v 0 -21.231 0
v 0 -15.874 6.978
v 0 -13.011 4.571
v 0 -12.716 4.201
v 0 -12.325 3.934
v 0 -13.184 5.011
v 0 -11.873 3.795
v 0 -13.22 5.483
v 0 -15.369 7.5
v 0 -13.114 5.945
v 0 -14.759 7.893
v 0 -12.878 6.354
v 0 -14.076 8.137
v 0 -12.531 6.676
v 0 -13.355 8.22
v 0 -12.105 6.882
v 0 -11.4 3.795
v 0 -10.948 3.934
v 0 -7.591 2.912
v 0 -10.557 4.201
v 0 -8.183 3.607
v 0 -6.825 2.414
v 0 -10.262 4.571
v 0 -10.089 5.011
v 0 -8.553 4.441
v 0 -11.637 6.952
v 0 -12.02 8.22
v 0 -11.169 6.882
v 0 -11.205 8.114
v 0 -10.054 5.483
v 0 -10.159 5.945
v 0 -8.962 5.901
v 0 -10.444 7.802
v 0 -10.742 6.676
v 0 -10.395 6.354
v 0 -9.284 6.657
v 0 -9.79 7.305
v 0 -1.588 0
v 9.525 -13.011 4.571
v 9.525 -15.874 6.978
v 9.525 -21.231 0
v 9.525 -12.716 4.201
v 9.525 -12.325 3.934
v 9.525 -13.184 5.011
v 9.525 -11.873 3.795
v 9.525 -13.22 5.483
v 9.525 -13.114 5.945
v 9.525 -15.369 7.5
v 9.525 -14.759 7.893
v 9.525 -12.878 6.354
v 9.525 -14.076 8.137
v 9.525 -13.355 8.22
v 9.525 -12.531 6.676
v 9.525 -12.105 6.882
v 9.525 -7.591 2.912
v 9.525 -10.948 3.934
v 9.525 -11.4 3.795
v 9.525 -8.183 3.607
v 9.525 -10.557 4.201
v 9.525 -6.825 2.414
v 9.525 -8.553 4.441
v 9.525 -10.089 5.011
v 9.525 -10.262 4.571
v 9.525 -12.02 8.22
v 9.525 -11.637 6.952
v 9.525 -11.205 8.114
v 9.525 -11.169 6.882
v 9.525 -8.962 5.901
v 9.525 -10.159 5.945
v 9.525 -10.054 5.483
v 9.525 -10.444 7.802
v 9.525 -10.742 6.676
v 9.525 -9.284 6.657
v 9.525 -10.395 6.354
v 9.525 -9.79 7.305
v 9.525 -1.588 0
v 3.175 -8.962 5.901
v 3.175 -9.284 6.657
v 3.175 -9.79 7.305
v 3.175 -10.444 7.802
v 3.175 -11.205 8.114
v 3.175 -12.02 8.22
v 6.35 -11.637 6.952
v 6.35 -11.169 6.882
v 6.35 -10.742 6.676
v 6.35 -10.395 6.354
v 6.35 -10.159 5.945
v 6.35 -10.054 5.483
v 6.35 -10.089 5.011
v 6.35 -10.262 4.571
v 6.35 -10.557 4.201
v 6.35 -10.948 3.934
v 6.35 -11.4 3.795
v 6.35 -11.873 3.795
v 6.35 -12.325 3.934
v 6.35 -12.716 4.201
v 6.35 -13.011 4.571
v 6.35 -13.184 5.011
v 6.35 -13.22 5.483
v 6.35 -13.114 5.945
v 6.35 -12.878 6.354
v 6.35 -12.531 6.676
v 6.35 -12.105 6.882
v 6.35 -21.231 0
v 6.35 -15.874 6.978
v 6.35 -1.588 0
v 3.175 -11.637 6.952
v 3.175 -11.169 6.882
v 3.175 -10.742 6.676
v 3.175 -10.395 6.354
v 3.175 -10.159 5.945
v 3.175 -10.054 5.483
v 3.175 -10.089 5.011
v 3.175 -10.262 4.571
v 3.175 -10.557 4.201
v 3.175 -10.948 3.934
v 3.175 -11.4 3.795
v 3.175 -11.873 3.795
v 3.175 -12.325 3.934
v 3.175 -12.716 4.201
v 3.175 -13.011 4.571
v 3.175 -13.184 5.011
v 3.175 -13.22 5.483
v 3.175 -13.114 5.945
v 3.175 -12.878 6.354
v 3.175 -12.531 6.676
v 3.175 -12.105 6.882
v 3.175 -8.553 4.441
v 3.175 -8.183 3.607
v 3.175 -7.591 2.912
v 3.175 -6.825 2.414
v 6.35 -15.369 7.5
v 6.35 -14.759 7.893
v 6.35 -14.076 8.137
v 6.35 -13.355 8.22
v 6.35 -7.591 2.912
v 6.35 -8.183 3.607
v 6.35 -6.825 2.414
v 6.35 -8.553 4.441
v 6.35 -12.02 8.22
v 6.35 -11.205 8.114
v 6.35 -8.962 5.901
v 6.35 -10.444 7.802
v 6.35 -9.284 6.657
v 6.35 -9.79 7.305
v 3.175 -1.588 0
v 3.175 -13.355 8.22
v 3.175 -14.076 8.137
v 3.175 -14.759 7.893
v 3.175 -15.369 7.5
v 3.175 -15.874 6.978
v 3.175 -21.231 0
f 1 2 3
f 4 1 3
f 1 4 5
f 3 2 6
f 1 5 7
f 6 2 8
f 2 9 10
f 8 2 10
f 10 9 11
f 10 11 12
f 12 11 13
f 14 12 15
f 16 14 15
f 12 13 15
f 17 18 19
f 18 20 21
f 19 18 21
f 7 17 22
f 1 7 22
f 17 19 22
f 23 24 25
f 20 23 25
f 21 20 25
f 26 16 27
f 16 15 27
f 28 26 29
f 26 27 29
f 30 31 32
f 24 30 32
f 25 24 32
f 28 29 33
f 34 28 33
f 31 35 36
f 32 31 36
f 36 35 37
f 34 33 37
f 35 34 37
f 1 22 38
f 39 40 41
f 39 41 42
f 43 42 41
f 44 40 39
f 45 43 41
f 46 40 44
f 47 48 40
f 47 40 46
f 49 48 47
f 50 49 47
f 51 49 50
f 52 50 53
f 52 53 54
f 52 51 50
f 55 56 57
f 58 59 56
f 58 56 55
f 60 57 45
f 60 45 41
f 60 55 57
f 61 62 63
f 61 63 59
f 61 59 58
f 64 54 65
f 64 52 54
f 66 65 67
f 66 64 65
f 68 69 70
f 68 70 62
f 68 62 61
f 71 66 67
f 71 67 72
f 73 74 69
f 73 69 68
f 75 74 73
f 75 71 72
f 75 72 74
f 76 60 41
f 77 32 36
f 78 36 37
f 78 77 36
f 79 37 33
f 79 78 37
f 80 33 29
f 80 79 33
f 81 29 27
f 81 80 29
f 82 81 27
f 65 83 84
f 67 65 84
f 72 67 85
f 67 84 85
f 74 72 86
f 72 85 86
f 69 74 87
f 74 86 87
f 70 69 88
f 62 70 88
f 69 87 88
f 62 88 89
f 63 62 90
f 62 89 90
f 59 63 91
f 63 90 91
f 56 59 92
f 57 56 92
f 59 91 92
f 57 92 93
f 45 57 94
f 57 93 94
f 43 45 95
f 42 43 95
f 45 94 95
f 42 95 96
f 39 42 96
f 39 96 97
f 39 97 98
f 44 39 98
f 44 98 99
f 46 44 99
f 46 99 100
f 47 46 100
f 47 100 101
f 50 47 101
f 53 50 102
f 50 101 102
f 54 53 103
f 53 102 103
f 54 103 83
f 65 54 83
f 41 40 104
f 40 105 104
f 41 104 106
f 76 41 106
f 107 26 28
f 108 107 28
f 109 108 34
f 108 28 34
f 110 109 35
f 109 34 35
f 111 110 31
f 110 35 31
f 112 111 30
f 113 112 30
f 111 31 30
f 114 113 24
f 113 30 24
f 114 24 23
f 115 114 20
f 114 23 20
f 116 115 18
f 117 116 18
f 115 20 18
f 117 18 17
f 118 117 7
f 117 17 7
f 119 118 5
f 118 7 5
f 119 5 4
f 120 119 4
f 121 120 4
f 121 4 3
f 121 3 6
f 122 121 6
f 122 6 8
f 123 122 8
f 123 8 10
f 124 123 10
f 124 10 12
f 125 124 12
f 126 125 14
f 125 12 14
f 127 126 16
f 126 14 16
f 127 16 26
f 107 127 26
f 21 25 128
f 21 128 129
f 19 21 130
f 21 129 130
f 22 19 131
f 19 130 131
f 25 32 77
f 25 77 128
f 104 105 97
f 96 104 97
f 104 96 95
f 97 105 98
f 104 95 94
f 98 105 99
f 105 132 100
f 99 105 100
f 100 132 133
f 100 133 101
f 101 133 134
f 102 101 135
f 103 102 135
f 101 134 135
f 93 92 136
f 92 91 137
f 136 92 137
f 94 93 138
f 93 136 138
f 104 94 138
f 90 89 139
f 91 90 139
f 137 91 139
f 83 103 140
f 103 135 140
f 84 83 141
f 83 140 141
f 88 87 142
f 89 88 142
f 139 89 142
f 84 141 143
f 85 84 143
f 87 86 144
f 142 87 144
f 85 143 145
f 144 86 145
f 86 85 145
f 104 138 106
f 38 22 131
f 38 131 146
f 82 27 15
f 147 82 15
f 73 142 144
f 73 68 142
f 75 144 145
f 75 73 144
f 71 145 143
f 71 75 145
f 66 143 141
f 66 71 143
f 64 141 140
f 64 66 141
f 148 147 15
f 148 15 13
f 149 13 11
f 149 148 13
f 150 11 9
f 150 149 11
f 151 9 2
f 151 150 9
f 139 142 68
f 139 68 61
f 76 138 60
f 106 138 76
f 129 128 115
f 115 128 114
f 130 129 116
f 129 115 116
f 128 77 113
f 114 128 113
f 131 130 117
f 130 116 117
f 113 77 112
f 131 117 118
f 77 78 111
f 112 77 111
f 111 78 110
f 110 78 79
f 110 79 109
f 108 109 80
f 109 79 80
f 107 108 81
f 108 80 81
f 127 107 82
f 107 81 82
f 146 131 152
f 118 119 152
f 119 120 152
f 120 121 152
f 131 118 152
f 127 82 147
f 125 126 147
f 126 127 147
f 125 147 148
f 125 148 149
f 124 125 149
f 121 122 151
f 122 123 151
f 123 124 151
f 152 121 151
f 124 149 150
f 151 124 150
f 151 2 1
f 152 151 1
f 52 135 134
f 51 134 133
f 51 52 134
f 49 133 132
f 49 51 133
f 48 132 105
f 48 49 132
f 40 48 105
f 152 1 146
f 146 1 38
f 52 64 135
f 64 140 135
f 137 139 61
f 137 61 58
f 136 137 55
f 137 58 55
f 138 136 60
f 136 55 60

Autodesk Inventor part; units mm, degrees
ref_plane "YZ Plane" through (0, 0, 0) normal (1, 0, 0) x (0, 1, 0)
ref_plane "XZ Plane" through (0, 0, 0) normal (0, 1, 0) x (-1, 0, 0)
ref_plane "XY Plane" through (0, 0, 0) normal (0, 0, 1) x (1, 0, 0)
sketch "Sketch1" plane through (0, 0, 0) normal (1, 0, 0) x (0, 1, 0)
  line L0 (-9.6115, 8.22) -> (-14.9205, 8.22)
  line L1 (-14.9205, 8.22) -> (-21.231, 0)
  line L2 (-21.231, 0) -> (-1.5875, 0)
  line L3 (-9.6115, 8.22) -> (-8.1578, 3.0283)
  line L4 (-8.1578, 3.0283) -> (-1.5875, 0)
  point P0 (0, 0)
extrude "Extrusion1" add sketch "Sketch1" along normal blind 9.525
fillet "Fillet1" radius 3.175 2 edges at (4.7625, -9.6115, 8.22) (4.7625, -14.9205, 8.22)
sketch "Sketch3" plane through (0, -13.3553, 8.22) normal (0, 0, 1) x (1, 0, 0)
  line L0 (6.35, -11.8558) -> (6.35, 11.9002)
  line L1 (6.35, 11.9002) -> (3.175, 11.9002)
  line L2 (3.175, 11.9002) -> (3.175, -11.8558)
  line L3 (3.175, -11.8558) -> (6.35, -11.8558)
  line L4 (0, 0.0222) -> (9.525, 0.0222) projected
  line L5 (6.35, -11.8558) -> (3.175, 11.9002) construction
  line L6 (6.35, 11.9002) -> (3.175, -11.8558) construction
  point P0 (0, 13.3553)
  point P1 (4.7625, 0.0222)
extrude "Extrusion2" cut sketch "Sketch3" against normal blind 9.525
sketch "Sketch4" plane through (0, 0, 0) normal (-1, 0, 0) x (0, 0, 1)
  circle A0 centre (5.3647, -11.6366) radius 1.5875
  point P0 (0, 0)
extrude "Extrusion3" cut sketch "Sketch4" against normal blind 9.525
fillet "Fillet2" radius 3.175 2 edges at (1.5875, -8.1578, 3.0283) (7.9375, -8.1578, 3.0283)
properties part number "LeverHolder"
